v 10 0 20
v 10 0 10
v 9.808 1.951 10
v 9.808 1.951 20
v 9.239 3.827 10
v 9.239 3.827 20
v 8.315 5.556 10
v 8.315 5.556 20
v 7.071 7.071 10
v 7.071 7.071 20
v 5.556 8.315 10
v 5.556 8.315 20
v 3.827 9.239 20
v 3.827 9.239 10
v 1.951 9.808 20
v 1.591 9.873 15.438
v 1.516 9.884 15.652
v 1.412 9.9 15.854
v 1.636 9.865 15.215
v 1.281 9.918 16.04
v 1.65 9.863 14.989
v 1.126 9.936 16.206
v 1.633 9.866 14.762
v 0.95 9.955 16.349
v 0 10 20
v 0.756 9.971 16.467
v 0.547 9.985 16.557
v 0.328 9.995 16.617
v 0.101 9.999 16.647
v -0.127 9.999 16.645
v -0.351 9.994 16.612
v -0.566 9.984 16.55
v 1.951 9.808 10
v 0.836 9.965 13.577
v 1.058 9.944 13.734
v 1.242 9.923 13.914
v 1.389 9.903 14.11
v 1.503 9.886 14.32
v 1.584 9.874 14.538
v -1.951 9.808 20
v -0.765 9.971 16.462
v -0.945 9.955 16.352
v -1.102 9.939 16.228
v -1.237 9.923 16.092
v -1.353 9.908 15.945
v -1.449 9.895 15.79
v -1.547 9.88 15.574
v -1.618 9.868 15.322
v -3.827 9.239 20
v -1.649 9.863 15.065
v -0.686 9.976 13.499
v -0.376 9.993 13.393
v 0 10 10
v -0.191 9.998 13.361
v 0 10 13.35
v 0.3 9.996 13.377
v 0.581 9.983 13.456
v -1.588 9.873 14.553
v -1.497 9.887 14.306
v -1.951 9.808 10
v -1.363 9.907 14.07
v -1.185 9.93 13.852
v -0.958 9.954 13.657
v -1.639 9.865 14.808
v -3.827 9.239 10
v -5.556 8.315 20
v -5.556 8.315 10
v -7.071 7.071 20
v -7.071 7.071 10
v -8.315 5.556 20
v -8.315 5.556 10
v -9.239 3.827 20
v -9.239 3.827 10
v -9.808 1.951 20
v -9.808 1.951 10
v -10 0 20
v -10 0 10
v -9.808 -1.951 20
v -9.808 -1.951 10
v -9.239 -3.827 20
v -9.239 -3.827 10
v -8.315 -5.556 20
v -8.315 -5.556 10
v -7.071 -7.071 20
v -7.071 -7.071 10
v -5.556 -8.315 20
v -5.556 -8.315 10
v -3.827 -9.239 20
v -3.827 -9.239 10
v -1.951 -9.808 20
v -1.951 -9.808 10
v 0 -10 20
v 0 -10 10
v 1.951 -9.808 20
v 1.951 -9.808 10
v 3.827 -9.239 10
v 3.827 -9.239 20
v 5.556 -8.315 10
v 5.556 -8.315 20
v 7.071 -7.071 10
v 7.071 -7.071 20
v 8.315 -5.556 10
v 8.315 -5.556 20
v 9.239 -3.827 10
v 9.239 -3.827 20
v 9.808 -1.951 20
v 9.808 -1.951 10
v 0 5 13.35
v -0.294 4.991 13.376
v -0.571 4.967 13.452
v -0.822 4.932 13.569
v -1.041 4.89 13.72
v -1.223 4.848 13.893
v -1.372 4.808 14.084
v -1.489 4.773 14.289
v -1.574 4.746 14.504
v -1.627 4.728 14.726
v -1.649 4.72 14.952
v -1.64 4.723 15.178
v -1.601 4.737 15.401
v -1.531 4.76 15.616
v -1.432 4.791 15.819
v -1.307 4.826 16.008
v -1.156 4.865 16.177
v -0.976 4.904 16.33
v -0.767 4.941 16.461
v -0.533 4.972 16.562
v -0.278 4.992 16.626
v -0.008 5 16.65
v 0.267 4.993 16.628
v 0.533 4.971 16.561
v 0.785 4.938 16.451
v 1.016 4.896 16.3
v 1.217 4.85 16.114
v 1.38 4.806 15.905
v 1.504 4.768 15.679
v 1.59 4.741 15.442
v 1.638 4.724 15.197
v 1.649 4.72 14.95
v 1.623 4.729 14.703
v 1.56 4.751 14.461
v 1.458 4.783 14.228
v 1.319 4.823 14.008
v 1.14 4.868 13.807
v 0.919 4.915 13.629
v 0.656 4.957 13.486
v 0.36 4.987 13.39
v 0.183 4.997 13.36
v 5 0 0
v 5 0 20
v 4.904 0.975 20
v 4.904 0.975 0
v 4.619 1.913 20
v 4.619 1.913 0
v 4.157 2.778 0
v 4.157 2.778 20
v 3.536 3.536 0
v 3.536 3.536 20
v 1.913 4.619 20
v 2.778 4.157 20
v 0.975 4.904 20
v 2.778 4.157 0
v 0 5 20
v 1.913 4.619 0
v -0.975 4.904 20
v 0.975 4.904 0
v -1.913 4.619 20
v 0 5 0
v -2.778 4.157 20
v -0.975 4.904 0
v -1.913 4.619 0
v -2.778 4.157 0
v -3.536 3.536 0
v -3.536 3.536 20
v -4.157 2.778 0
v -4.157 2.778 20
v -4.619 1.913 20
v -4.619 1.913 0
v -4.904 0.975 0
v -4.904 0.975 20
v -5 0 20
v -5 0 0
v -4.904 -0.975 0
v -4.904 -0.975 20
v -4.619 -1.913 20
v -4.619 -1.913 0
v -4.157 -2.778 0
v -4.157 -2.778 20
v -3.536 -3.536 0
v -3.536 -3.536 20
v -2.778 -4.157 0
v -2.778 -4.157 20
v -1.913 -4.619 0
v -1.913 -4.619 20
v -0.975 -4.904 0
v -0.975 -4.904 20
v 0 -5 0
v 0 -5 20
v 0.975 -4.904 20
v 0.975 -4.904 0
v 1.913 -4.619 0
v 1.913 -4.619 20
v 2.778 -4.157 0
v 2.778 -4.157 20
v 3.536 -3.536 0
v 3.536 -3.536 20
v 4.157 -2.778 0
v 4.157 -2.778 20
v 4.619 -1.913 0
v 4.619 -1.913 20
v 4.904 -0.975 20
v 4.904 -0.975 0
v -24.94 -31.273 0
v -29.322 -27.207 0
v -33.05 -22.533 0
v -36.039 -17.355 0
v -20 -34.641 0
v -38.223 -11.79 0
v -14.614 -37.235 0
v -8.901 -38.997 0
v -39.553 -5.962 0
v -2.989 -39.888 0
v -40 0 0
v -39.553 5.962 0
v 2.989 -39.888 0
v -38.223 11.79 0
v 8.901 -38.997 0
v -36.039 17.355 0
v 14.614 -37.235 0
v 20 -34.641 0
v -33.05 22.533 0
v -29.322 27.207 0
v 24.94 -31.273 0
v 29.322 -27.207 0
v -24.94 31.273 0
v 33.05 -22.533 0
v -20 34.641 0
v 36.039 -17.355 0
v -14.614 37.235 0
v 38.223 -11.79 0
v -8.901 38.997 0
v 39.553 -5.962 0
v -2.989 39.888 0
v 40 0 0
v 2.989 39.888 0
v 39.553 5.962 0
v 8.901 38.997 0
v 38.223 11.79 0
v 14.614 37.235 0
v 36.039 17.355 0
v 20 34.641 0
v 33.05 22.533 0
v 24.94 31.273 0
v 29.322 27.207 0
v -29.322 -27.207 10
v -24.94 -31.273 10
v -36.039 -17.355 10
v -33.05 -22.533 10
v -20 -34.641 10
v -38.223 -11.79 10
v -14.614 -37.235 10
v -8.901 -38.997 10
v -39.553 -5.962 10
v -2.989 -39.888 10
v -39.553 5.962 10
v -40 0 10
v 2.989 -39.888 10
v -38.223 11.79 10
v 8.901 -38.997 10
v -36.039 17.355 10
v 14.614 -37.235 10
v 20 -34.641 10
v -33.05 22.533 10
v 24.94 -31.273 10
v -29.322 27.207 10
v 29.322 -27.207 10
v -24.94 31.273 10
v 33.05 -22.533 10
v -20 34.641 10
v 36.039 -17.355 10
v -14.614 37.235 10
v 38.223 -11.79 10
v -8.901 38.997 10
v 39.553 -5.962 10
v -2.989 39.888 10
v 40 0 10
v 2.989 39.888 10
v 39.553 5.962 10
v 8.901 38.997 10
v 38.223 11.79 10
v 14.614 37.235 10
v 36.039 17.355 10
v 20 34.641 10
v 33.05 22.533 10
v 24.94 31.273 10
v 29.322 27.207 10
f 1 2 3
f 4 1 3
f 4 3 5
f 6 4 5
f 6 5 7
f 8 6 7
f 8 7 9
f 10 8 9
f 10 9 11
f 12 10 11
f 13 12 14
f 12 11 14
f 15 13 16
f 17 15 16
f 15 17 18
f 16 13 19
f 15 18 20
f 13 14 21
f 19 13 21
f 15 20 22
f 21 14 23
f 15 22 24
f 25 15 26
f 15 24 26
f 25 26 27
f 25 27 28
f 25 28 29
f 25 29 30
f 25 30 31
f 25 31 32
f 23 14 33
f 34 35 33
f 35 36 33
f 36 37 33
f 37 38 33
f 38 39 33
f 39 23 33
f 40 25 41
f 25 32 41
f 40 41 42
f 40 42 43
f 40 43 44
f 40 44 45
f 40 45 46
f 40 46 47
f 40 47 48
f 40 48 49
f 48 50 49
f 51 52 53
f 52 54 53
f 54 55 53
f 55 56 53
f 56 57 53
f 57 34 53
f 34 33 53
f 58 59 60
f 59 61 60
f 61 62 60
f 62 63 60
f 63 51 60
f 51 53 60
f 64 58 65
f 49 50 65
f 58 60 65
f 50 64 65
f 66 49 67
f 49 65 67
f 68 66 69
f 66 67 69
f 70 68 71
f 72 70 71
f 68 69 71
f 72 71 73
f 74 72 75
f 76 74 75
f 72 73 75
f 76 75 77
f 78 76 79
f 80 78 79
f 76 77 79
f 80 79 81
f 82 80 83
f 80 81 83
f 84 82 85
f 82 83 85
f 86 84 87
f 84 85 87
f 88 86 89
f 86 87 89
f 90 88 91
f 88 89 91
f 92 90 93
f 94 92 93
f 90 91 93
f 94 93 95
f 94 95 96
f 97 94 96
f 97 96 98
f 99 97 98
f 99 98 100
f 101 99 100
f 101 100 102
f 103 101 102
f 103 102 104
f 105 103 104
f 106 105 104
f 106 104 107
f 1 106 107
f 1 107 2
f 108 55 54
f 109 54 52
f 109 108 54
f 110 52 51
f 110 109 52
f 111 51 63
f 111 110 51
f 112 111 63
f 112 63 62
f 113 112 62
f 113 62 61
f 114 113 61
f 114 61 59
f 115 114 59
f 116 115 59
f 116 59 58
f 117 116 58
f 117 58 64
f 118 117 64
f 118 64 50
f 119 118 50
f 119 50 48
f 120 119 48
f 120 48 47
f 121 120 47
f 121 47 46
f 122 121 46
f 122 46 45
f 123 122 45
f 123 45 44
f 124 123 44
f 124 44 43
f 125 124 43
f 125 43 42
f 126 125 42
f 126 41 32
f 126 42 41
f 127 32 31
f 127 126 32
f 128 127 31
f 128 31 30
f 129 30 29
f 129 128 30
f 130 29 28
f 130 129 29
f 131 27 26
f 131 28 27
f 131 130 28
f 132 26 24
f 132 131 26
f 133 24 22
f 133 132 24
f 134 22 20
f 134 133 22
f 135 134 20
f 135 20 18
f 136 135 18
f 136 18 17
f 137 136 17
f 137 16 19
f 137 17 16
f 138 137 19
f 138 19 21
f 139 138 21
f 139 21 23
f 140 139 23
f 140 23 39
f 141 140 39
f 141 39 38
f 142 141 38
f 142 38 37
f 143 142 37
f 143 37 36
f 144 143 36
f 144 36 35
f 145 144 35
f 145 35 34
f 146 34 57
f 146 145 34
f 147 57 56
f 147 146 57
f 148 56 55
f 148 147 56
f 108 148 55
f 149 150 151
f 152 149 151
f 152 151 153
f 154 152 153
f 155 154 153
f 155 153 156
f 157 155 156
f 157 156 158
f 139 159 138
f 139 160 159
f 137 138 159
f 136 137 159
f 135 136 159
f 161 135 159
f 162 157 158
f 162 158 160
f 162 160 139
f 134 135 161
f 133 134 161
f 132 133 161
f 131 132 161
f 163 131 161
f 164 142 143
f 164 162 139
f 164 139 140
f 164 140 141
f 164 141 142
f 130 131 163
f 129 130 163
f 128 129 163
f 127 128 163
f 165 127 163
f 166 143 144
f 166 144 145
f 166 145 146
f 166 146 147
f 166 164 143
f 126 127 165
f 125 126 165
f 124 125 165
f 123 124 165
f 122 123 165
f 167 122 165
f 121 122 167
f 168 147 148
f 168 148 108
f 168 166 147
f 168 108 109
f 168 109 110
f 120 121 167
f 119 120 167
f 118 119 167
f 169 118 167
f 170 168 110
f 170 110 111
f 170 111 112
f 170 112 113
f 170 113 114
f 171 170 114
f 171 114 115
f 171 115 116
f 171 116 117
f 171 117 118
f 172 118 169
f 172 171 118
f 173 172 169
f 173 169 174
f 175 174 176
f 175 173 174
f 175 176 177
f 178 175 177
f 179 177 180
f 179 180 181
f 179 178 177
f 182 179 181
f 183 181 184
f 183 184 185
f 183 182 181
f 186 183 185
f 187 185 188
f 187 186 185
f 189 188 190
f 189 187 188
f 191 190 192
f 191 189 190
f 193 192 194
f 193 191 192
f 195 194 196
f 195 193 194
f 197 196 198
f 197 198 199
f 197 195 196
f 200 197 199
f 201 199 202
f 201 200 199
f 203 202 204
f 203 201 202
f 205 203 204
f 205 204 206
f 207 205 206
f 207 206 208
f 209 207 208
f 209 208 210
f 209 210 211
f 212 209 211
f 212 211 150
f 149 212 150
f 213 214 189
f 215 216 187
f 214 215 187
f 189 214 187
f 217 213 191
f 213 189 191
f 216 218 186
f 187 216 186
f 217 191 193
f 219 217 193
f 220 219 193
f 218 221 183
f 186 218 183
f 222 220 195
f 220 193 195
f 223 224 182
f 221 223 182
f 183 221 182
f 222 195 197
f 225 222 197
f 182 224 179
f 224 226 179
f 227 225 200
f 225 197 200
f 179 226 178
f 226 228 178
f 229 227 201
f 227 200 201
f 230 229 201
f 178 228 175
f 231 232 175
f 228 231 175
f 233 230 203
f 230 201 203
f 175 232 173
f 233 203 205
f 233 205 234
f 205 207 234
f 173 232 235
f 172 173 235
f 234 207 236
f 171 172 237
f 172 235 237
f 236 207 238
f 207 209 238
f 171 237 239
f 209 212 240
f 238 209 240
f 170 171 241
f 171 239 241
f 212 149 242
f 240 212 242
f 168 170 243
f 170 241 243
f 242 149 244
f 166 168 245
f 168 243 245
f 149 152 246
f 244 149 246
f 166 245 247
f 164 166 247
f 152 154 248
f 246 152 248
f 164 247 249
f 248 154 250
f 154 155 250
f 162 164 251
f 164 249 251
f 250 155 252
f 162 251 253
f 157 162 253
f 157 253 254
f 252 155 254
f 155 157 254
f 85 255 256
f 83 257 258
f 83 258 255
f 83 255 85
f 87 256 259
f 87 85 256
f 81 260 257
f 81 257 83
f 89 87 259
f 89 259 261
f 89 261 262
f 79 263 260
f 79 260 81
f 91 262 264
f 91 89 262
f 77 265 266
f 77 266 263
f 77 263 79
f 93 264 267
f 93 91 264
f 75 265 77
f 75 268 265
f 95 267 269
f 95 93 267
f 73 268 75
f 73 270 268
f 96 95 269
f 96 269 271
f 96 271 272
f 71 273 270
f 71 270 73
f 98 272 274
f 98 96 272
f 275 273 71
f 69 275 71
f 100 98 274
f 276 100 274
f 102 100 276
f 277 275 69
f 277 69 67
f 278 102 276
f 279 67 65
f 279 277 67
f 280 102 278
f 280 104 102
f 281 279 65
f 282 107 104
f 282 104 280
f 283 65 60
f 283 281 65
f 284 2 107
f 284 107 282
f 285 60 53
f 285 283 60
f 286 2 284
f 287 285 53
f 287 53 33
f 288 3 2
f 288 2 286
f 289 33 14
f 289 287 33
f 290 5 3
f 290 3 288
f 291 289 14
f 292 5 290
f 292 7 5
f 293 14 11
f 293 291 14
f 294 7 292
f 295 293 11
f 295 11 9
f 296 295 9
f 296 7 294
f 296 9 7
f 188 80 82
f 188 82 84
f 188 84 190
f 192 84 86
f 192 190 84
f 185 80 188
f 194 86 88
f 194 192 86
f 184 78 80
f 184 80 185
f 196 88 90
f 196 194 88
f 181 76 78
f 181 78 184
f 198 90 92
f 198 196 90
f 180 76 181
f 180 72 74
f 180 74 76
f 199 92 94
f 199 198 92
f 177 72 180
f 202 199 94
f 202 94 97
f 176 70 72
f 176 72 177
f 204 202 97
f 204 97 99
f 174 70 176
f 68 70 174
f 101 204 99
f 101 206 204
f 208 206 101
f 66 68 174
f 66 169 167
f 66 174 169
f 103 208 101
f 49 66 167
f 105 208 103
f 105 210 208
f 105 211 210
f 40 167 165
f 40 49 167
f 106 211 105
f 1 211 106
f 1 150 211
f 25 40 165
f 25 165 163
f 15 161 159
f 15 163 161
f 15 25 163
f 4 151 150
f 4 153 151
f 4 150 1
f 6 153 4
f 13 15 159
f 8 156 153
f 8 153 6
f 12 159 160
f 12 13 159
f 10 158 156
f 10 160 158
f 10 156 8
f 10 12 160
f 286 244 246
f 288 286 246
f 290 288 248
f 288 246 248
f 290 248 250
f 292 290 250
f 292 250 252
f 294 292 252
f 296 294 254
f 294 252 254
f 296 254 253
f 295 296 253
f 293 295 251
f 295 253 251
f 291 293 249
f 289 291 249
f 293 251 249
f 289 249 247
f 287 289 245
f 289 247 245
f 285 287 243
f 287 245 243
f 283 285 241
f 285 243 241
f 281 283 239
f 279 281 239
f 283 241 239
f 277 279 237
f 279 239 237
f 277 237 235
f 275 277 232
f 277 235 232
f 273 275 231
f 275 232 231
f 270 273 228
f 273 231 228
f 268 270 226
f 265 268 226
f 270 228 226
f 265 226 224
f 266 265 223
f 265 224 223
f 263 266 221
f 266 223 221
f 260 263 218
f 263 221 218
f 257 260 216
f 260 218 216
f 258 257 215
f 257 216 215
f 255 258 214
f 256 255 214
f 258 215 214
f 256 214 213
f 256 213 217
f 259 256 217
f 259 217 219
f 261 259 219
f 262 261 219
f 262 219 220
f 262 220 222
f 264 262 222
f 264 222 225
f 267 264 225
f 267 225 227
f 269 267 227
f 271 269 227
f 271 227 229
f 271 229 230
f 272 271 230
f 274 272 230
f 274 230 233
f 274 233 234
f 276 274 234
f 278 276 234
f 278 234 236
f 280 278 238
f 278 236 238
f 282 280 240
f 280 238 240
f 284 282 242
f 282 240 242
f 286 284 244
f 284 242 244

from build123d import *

# Parameters (mm, degrees)
SKETCH1_R           = 40
BOSS_EXTRUDE1_DEPTH = 10
SKETCH2_R           = 10
BOSS_EXTRUDE2_DEPTH = 10
SKETCH3_R           = 5
CUT_EXTRUDE1_DEPTH  = 20
SKETCH4_R           = 1.65
CUT_EXTRUDE2_DEPTH  = 10


with BuildPart() as part:
    # Sketch1 → Boss-Extrude1 (new body)
    with BuildSketch(Plane.XY):
        Circle(SKETCH1_R)
    extrude(amount=BOSS_EXTRUDE1_DEPTH)

    # Sketch2 → Boss-Extrude2 (add)
    with BuildSketch(Plane.XY.offset(10)):
        Circle(SKETCH2_R)
    extrude(amount=BOSS_EXTRUDE2_DEPTH)

    # Sketch3 → Cut-Extrude1 (cut)
    with BuildSketch(Plane.XY):
        Circle(SKETCH3_R)
    extrude(amount=CUT_EXTRUDE1_DEPTH, mode=Mode.SUBTRACT)

    # Sketch4 → Cut-Extrude2 (cut)
    with BuildSketch(Plane(origin=(0, 0, 0), x_dir=(1, 0, 0), z_dir=(0, 1, 0))):
        with Locations((0, -15)):
            Circle(SKETCH4_R)
    extrude(amount=CUT_EXTRUDE2_DEPTH, mode=Mode.SUBTRACT)


solid = part.part
